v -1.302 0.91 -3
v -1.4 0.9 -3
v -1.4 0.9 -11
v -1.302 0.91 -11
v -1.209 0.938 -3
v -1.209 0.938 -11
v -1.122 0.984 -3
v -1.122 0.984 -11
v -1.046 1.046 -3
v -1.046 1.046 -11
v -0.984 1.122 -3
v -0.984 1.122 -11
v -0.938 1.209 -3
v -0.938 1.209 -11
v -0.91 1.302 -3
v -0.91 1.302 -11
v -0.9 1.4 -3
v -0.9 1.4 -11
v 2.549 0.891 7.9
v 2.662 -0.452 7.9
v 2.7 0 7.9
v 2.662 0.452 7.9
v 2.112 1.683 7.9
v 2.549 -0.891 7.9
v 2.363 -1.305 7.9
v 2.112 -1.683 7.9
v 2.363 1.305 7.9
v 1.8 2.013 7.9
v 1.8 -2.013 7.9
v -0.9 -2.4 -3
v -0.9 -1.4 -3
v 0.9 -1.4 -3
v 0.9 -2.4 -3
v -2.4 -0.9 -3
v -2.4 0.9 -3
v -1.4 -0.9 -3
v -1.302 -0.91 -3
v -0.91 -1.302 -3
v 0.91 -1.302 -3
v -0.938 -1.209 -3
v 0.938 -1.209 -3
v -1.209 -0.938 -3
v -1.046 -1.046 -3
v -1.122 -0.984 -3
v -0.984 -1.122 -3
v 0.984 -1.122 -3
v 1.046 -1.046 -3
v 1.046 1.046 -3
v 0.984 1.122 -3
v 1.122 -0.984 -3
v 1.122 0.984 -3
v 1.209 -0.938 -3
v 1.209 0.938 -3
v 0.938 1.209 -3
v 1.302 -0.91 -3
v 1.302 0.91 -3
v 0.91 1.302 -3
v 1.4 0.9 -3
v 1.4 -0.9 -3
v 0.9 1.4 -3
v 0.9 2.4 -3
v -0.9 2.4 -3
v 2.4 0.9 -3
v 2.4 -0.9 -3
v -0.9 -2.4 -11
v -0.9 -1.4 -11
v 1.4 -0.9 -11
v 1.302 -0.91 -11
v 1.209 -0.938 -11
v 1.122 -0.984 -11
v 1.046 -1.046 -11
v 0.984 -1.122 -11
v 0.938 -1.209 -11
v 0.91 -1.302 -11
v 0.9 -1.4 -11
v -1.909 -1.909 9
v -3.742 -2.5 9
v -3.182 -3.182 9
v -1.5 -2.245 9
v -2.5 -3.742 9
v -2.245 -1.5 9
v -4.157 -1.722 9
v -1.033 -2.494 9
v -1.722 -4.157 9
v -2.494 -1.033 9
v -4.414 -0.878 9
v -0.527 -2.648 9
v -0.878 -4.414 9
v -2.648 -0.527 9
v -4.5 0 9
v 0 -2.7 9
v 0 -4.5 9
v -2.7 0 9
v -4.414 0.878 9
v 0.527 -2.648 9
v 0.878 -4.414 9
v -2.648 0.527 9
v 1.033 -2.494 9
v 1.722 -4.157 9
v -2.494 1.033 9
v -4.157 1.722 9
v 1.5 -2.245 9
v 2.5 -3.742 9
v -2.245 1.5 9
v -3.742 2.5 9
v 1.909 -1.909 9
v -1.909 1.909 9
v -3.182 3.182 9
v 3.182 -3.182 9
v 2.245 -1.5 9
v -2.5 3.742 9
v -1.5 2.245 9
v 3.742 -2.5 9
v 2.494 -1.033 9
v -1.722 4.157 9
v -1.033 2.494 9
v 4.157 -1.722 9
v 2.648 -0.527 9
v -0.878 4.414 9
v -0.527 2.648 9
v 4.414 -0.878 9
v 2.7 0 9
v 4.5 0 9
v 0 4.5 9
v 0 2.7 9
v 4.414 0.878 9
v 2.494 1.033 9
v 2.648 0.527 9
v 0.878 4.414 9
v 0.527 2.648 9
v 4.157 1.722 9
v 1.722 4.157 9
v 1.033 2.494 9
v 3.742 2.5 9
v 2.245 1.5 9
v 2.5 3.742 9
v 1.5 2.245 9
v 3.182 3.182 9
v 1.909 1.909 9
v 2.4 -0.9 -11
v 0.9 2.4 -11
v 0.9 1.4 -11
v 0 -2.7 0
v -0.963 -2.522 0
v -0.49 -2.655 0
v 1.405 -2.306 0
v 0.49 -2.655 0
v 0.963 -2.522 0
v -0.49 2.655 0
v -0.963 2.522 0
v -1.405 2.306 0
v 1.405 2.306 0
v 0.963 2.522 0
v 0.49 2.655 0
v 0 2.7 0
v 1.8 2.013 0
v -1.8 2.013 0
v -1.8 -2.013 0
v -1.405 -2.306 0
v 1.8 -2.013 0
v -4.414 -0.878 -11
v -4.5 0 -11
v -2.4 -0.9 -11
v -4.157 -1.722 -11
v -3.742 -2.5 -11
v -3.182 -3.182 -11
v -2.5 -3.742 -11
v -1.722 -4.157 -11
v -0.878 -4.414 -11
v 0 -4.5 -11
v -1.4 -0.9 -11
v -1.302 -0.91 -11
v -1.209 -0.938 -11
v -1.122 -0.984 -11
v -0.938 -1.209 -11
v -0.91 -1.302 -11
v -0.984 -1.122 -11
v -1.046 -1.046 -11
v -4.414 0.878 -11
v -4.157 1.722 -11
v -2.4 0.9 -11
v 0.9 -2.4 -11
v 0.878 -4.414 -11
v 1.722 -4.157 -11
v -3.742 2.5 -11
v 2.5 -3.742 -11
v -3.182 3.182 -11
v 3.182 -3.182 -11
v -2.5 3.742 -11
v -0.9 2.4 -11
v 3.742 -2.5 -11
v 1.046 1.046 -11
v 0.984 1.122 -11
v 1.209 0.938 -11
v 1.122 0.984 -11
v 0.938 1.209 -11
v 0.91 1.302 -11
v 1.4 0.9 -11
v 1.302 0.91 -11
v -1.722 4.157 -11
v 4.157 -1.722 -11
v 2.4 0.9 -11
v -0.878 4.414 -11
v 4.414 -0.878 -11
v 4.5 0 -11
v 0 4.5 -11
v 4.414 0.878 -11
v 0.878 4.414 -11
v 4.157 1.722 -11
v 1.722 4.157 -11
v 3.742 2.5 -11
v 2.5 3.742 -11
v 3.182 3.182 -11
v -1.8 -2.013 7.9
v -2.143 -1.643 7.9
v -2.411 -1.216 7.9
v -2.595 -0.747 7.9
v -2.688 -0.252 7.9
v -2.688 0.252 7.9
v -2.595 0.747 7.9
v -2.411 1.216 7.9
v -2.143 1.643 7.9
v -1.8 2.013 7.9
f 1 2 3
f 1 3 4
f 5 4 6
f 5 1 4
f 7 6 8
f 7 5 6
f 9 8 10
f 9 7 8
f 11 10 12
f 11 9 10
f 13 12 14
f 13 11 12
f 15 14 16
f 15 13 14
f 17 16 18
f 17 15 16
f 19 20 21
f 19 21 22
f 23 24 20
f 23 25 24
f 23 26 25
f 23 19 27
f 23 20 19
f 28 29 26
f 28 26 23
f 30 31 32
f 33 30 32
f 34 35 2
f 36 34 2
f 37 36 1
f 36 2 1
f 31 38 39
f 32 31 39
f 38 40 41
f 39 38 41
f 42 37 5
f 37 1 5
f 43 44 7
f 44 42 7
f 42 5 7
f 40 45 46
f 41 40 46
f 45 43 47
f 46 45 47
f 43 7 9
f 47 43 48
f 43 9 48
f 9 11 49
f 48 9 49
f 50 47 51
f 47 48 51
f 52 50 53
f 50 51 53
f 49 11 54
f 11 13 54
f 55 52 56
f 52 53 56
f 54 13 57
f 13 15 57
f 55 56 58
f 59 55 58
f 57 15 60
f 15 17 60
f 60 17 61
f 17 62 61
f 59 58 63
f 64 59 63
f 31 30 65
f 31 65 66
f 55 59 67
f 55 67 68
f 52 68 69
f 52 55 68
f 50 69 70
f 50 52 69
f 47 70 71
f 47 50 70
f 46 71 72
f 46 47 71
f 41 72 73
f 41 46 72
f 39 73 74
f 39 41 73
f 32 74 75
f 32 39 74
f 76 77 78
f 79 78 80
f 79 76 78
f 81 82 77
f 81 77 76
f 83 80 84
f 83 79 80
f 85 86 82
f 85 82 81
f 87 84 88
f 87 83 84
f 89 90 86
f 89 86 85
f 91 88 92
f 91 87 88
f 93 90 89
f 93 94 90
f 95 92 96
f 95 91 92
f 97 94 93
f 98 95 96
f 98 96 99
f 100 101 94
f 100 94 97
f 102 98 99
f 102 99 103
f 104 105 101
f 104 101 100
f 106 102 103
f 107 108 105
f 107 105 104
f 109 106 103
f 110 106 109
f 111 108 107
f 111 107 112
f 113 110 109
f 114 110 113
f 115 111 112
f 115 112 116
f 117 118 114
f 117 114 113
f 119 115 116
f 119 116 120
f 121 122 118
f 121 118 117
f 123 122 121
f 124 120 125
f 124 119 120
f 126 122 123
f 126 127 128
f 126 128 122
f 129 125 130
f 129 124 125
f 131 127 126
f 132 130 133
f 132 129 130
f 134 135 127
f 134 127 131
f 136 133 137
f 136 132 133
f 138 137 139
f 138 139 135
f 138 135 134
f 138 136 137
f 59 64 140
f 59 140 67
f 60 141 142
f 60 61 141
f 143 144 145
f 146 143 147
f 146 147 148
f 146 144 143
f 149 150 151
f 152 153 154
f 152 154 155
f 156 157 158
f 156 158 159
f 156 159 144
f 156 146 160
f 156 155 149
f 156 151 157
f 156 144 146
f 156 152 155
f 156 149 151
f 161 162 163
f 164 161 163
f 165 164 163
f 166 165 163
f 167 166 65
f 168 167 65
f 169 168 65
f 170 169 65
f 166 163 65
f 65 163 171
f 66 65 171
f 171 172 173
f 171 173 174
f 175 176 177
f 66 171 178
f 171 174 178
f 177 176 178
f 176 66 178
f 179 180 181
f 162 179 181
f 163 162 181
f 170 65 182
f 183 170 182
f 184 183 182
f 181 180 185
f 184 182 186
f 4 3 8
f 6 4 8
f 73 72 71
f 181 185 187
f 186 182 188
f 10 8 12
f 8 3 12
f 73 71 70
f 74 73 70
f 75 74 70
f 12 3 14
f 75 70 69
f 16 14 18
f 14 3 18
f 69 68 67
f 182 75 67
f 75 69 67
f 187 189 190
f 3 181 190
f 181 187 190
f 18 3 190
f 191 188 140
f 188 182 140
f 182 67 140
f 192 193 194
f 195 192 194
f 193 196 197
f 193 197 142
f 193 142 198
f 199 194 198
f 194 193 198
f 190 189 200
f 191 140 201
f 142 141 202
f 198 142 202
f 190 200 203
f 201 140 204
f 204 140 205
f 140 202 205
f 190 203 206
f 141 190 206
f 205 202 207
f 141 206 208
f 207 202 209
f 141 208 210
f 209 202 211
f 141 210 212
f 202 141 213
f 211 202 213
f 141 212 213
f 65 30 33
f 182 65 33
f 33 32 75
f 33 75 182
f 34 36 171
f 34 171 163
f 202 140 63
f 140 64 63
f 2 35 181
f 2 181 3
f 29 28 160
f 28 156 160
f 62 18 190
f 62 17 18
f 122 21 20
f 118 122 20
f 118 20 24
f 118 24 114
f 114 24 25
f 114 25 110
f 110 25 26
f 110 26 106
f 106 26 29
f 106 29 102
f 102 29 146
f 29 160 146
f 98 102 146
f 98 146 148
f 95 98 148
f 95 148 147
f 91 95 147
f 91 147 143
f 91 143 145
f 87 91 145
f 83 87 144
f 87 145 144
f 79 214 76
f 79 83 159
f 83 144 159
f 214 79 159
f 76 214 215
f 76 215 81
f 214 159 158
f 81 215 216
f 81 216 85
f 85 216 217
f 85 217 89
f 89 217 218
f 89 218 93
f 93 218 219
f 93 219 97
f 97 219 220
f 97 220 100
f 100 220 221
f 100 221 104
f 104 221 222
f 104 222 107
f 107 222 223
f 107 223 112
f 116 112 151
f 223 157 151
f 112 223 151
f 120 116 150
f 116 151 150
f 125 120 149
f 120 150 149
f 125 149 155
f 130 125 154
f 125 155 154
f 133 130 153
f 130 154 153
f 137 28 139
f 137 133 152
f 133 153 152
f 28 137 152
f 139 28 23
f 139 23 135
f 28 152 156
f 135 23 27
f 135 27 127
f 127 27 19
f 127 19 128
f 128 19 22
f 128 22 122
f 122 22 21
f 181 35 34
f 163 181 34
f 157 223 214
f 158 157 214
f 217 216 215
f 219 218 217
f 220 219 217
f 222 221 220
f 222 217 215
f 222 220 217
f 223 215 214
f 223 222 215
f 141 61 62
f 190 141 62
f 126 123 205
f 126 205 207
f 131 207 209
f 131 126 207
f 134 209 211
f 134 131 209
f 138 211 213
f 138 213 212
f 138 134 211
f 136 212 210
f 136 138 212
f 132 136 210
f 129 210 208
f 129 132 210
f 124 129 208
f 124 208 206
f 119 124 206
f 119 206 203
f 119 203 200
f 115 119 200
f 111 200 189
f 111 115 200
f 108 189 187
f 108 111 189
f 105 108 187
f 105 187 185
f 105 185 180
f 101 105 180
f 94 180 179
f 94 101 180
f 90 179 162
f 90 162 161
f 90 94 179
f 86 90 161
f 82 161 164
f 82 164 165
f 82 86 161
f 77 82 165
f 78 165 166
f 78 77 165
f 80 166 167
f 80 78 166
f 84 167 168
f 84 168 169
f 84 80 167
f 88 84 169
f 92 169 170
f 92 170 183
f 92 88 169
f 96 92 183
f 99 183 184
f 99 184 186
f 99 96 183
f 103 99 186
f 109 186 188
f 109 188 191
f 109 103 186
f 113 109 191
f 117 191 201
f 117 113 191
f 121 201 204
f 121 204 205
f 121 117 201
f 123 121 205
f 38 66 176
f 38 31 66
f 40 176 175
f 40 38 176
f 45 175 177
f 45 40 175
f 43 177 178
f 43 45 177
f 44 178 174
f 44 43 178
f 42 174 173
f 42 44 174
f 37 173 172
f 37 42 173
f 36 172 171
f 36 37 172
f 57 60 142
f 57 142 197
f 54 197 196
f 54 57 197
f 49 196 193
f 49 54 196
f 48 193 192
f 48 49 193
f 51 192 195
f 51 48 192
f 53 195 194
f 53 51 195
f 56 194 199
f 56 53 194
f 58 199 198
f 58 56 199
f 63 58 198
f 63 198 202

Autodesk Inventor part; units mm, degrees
ref_plane "YZ Plane" through (0, 0, 0) normal (1, 0, 0) x (0, 1, 0)
ref_plane "XZ Plane" through (0, 0, 0) normal (0, 1, 0) x (-1, 0, 0)
ref_plane "XY Plane" through (0, 0, 0) normal (0, 0, 1) x (1, 0, 0)
sketch "Motor_Lego_Axle_Connector" plane through (0, 0, 0) normal (0, 0, 1) x (1, 0, 0)
  circle A0 centre (0, 0) radius 4.5
  circle A1 centre (0, 0) radius 2.7
  line L0 (-1.8, 2.0125) -> (-1.8, -2.0125)
  line L1 (0, 4.5) -> (0, -4.5) construction
  line L2 (1.8, 2.0125) -> (1.8, -2.0125)
  line L3 (0.9, 2.4) -> (-0.9, 2.4)
  line L4 (0.9, 2.4) -> (0.9, 1.4)
  line L5 (1.4, 1.4) -> (0.9, 1.4) construction
  line L6 (1.4, 1.4) -> (1.4, 0.9) construction
  arc A2 (0.9, 1.4) -> (1.4, 0.9) centre (1.4, 1.4) ccw
  line L7 (1.4, 0.9) -> (2.4, 0.9)
  line L8 (-0.9, 1.4) -> (-0.9, 2.4)
  arc A3 (-1.4, 0.9) -> (-0.9, 1.4) centre (-1.4, 1.4) ccw
  line L9 (-2.4, 0.9) -> (-1.4, 0.9)
  line L10 (-2.4, 0.9) -> (-2.4, -0.9)
  line L11 (-1.4, -0.9) -> (-2.4, -0.9)
  arc A4 (-0.9, -1.4) -> (-1.4, -0.9) centre (-1.4, -1.4) ccw
  line L12 (-0.9, -2.4) -> (-0.9, -1.4)
  line L13 (-0.9, -2.4) -> (0.9, -2.4)
  line L14 (0.9, -1.4) -> (0.9, -2.4)
  arc A5 (1.4, -0.9) -> (0.9, -1.4) centre (1.4, -1.4) ccw
  line L15 (2.4, -0.9) -> (1.4, -0.9)
  line L16 (2.4, -0.9) -> (2.4, 0.9)
  point P0 (1.8, -2.0125)
  point P1 (0, 2.4)
  point P2 (-2.4, 0)
  point P3 (0, -2.4)
  point P4 (2.4, 0)
  dimension "d0" = 9
  dimension "d1" = 5.4
  dimension "d2" = 9
  dimension "d3" = 1.8
  dimension "d12" = 1.8
  dimension "d13" = 2.4
  dimension "d14" = 1
  dimension "d16" = 0.5
  dimension "d17" = 1
  dimension "d20" = 360
extrude "Motor_Side_Outer_Ring_Extrusion" add sketch "Motor_Lego_Axle_Connector" along normal blind 9
extrude "Motor_Connector_Extrusion" add sketch "Motor_Lego_Axle_Connector" along normal blind 7.9 separate body contours A1 L2 L15 L16 L7 | L0 L9 L10 L11 A1 | L7 L16 L15 L2 | L0 L11 L10 L9
extrude "Seperation_Extrusion" add sketch "Motor_Lego_Axle_Connector" against normal blind 3 contours A1 L2 L15 L16 L7 | L2 L7 A2 L4 L3 L8 A3 L9 L0 A1 | A1 L0 L11 A4 L12 L13 L14 A5 L15 L2 | L0 L9 L10 L11 A1 | L7 L16 L15 L2 | L2 L15 A5 L14 L13 L12 A4 L11 L0 L9 A3 L8 L3 L4 A2 L7 | L0 L11 L10 L9
extrude "Lego_Axle_Side_Outer_Ring_Extrusion" add sketch "Motor_Lego_Axle_Connector" against normal blind 11
extrude "Lego_Axle_Connector_Extrusion" add sketch "Motor_Lego_Axle_Connector" against normal blind 11 contours A1 L2 L15 L16 L7 | L2 L7 A2 L4 L3 L8 A3 L9 L0 A1 | A1 L0 L11 A4 L12 L13 L14 A5 L15 L2 | L0 L9 L10 L11 A1
equation "\"d2\" = d0"
properties part number "Motor_Lego_Axle_Connector"
